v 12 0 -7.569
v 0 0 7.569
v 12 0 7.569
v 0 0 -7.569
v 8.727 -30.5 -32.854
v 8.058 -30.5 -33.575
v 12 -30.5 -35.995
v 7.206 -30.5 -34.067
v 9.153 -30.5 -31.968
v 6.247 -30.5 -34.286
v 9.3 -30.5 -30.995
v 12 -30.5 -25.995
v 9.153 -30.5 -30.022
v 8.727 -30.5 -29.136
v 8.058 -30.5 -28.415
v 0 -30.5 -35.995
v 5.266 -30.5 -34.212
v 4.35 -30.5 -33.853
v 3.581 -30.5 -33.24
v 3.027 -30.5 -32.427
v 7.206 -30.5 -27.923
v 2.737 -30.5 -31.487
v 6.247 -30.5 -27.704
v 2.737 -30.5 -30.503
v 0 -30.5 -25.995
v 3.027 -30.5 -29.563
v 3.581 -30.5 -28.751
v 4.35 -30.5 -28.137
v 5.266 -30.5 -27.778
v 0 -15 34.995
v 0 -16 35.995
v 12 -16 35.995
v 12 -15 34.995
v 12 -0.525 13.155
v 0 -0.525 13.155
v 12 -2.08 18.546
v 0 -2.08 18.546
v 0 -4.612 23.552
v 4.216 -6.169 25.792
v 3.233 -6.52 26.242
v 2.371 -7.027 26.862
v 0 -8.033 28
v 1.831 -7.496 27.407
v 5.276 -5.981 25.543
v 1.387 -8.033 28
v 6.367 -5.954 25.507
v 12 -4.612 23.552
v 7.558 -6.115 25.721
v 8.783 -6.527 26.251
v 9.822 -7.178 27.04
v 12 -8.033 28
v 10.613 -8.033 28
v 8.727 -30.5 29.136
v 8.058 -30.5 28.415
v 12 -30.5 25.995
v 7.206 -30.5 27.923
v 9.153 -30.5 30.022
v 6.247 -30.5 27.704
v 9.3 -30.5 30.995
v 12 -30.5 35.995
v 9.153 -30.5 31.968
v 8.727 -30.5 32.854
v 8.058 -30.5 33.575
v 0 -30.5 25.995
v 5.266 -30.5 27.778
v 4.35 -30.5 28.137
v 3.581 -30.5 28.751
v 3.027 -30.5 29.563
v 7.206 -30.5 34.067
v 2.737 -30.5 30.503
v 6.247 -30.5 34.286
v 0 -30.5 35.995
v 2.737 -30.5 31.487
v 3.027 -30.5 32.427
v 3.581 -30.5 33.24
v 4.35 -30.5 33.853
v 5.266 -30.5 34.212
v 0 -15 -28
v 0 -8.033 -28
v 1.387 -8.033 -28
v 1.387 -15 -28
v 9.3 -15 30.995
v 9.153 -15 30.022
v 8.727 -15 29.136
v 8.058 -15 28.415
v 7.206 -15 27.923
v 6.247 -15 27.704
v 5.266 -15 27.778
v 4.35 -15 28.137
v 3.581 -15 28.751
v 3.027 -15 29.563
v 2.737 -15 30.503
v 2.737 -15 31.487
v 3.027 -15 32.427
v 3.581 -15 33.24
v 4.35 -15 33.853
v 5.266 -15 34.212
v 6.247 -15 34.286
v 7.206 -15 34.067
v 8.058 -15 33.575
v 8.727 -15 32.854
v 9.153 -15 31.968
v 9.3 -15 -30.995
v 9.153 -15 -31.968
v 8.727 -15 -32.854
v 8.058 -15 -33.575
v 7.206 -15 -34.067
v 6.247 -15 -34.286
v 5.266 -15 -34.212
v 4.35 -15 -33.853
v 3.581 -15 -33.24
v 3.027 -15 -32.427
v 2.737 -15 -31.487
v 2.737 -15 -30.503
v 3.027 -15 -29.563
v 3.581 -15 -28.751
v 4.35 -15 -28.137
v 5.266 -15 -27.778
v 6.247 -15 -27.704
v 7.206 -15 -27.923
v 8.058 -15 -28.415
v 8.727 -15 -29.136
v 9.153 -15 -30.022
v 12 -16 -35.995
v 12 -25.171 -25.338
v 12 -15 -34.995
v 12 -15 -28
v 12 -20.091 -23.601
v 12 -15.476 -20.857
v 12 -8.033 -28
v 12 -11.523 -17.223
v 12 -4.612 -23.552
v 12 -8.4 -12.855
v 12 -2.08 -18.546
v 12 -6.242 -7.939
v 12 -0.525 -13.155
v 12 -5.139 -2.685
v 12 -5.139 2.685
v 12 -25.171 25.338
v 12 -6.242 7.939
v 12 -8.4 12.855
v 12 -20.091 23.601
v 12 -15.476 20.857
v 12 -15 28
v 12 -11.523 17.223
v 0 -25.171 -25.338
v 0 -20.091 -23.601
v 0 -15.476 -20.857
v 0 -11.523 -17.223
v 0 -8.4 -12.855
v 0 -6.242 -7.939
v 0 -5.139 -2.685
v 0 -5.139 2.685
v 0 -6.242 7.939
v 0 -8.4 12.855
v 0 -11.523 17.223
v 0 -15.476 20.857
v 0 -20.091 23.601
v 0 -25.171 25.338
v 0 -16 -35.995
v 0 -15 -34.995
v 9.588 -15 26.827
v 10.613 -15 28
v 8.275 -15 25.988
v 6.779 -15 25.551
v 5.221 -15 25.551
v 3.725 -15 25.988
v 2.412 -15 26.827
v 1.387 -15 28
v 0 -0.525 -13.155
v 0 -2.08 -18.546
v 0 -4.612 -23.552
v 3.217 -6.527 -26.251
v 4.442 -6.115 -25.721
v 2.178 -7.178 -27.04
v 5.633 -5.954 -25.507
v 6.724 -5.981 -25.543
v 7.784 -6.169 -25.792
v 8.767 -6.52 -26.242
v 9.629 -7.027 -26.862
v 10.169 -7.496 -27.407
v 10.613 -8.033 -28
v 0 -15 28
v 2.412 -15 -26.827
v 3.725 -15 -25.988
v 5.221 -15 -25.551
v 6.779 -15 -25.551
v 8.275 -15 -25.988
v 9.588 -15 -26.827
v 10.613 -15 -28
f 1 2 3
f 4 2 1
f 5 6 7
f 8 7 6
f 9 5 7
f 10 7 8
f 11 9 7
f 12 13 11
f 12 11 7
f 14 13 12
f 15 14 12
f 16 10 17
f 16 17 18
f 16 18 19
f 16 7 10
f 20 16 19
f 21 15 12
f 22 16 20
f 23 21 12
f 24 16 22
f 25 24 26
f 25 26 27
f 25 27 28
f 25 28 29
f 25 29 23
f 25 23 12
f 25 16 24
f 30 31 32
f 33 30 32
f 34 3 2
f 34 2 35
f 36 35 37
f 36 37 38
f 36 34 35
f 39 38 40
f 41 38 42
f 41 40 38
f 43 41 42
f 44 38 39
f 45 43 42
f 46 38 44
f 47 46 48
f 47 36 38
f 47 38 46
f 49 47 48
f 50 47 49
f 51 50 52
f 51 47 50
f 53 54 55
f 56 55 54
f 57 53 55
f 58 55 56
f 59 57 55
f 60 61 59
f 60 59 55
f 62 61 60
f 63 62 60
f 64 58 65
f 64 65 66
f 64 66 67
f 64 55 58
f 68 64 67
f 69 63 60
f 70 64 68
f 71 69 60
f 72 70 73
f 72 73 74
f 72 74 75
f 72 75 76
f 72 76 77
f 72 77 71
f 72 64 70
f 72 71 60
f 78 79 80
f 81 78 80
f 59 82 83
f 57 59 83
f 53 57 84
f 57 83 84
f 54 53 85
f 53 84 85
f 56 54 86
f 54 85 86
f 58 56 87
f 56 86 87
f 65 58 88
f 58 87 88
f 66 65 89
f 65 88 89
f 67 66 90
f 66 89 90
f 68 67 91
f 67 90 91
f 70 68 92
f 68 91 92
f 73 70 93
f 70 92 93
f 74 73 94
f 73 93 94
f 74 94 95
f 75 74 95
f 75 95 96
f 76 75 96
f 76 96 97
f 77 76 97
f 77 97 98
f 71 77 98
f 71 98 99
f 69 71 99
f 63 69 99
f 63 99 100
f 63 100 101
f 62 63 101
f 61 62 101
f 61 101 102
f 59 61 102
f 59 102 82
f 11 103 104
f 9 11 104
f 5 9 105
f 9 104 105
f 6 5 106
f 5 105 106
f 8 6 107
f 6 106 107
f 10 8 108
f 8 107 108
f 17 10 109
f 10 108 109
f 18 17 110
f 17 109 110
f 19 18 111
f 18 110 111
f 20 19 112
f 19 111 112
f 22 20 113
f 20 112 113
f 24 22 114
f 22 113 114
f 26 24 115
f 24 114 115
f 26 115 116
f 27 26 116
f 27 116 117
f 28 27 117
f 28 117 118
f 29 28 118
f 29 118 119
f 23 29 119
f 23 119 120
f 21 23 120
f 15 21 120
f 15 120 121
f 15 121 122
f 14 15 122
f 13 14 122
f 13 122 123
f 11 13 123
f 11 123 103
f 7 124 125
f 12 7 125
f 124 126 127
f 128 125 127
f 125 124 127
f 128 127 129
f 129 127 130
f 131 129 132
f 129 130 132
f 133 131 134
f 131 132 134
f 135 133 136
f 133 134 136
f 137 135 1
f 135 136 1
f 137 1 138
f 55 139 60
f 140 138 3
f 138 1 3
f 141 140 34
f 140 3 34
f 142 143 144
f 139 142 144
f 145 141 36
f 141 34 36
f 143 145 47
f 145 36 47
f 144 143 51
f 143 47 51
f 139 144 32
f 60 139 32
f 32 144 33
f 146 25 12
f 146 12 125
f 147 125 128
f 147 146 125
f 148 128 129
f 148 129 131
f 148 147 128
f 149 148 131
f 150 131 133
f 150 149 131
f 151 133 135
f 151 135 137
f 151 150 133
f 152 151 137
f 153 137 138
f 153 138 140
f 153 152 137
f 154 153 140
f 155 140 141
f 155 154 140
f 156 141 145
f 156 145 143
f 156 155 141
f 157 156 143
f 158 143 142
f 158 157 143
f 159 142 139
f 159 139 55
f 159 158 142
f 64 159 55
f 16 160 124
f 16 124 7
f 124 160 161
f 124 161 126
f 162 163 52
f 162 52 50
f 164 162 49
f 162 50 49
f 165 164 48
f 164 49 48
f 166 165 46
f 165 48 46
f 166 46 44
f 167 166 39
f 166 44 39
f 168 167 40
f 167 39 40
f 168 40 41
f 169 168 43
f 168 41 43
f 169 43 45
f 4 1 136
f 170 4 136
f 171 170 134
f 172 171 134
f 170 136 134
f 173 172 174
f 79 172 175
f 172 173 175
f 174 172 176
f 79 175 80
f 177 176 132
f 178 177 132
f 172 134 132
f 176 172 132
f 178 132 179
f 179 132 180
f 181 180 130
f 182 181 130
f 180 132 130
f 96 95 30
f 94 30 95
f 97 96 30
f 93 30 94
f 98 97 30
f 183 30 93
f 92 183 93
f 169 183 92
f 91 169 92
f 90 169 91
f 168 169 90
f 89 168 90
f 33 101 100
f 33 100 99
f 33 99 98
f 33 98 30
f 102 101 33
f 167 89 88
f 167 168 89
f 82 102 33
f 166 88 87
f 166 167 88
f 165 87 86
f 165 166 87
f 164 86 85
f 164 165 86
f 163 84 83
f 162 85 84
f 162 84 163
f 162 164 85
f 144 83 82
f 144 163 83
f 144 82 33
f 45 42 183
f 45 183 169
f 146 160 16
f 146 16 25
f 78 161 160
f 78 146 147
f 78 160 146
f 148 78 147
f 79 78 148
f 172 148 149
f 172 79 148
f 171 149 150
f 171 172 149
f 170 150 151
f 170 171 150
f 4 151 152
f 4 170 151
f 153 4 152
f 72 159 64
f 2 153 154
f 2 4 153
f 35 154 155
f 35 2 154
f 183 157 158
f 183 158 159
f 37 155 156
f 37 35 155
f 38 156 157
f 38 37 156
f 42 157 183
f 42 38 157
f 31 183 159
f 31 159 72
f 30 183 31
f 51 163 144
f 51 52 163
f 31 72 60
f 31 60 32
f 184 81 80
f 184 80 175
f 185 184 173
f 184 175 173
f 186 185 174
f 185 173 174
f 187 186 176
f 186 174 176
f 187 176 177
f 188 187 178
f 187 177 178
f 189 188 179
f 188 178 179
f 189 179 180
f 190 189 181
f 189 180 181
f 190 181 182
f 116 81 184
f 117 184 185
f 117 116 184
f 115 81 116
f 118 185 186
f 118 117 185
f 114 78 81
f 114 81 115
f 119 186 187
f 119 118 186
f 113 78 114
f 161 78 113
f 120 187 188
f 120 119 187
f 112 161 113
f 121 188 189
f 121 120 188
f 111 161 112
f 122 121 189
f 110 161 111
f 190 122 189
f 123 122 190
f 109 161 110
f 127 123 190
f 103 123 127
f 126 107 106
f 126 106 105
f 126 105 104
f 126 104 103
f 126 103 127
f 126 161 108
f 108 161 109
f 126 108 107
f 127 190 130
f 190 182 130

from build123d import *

# Parameters (mm, degrees)
BOSS_EXTRUDE1_DEPTH  = 12
CHAMFER1_SIZE        = 16
FILLET1_R            = 30
M6_CLEARANCE_HOLE1_D = 6.6
SKETCH4_R            = 5.5
CUT_EXTRUDE1_DEPTH   = 15
SKETCH5_W            = 23.874068734
SKETCH5_H            = 12.946873537
CUT_EXTRUDE2_DEPTH   = 15


with BuildPart() as part:
    # Sketch1 → Boss-Extrude1 (new body)
    with BuildSketch(Plane(origin=(0, 0, 0), x_dir=(0, 0, -1), z_dir=(1, 0, 0))):
        with BuildLine():
            Line((-35.995191863, 0), (35.995191863, 0))
            Line((35.995191863, 0), (35.995191863, -30.5))
            Line((35.995191863, -30.5), (25.995191863, -30.5))
            ThreePointArc((25.995191863, -30.5), (0, -5), (-25.995191863, -30.5))
            Line((-25.995191863, -30.5), (-35.995191863, -30.5))
            Line((-35.995191863, -30.5), (-35.995191863, 0))
        make_face()
    extrude(amount=BOSS_EXTRUDE1_DEPTH)

    # Chamfer1
    chamfer1_edges = [part.edges().sort_by_distance(p)[0] for p in [
        (6, 0, 35.995191863),
        (6, 0, -35.995191863),
    ]]
    chamfer(chamfer1_edges, length=CHAMFER1_SIZE)

    # Fillet1
    fillet1_edges = [part.edges().sort_by_distance(p)[0] for p in [
        (6, 0, 19.995191863),
        (6, 0, -19.995191863),
    ]]
    fillet(fillet1_edges, radius=FILLET1_R)

    # M6 Clearance Hole1 (through all)
    with Locations(Plane(origin=(0, -30.5, 0), x_dir=(-1, 0, 0), z_dir=(0, -1, 0))):
        with Locations((-6, -30.995191863), (-6, 30.995191863)):
            Hole(M6_CLEARANCE_HOLE1_D / 2)

    # Sketch4 → Cut-Extrude1 (cut)
    with BuildSketch(Plane(origin=(0, 0, 0), x_dir=(1, 0, 0), z_dir=(0, 1, 0))):
        with Locations((6, -30.995191863)):
            Circle(SKETCH4_R)
        with Locations((6, 30.995191863)):
            Circle(SKETCH4_R)
    extrude(amount=-CUT_EXTRUDE1_DEPTH, mode=Mode.SUBTRACT)

    # Sketch5 → Cut-Extrude2 (cut)
    with BuildSketch(Plane(origin=(0, 0, 0), x_dir=(1, 0, 0), z_dir=(0, 1, 0))):
        with Locations((6, -34.473436769)):
            Rectangle(SKETCH5_W, SKETCH5_H)
        with Locations((6, 34.473436769)):
            Rectangle(SKETCH5_W, SKETCH5_H)
    extrude(amount=-CUT_EXTRUDE2_DEPTH, mode=Mode.SUBTRACT)


solid = part.part
